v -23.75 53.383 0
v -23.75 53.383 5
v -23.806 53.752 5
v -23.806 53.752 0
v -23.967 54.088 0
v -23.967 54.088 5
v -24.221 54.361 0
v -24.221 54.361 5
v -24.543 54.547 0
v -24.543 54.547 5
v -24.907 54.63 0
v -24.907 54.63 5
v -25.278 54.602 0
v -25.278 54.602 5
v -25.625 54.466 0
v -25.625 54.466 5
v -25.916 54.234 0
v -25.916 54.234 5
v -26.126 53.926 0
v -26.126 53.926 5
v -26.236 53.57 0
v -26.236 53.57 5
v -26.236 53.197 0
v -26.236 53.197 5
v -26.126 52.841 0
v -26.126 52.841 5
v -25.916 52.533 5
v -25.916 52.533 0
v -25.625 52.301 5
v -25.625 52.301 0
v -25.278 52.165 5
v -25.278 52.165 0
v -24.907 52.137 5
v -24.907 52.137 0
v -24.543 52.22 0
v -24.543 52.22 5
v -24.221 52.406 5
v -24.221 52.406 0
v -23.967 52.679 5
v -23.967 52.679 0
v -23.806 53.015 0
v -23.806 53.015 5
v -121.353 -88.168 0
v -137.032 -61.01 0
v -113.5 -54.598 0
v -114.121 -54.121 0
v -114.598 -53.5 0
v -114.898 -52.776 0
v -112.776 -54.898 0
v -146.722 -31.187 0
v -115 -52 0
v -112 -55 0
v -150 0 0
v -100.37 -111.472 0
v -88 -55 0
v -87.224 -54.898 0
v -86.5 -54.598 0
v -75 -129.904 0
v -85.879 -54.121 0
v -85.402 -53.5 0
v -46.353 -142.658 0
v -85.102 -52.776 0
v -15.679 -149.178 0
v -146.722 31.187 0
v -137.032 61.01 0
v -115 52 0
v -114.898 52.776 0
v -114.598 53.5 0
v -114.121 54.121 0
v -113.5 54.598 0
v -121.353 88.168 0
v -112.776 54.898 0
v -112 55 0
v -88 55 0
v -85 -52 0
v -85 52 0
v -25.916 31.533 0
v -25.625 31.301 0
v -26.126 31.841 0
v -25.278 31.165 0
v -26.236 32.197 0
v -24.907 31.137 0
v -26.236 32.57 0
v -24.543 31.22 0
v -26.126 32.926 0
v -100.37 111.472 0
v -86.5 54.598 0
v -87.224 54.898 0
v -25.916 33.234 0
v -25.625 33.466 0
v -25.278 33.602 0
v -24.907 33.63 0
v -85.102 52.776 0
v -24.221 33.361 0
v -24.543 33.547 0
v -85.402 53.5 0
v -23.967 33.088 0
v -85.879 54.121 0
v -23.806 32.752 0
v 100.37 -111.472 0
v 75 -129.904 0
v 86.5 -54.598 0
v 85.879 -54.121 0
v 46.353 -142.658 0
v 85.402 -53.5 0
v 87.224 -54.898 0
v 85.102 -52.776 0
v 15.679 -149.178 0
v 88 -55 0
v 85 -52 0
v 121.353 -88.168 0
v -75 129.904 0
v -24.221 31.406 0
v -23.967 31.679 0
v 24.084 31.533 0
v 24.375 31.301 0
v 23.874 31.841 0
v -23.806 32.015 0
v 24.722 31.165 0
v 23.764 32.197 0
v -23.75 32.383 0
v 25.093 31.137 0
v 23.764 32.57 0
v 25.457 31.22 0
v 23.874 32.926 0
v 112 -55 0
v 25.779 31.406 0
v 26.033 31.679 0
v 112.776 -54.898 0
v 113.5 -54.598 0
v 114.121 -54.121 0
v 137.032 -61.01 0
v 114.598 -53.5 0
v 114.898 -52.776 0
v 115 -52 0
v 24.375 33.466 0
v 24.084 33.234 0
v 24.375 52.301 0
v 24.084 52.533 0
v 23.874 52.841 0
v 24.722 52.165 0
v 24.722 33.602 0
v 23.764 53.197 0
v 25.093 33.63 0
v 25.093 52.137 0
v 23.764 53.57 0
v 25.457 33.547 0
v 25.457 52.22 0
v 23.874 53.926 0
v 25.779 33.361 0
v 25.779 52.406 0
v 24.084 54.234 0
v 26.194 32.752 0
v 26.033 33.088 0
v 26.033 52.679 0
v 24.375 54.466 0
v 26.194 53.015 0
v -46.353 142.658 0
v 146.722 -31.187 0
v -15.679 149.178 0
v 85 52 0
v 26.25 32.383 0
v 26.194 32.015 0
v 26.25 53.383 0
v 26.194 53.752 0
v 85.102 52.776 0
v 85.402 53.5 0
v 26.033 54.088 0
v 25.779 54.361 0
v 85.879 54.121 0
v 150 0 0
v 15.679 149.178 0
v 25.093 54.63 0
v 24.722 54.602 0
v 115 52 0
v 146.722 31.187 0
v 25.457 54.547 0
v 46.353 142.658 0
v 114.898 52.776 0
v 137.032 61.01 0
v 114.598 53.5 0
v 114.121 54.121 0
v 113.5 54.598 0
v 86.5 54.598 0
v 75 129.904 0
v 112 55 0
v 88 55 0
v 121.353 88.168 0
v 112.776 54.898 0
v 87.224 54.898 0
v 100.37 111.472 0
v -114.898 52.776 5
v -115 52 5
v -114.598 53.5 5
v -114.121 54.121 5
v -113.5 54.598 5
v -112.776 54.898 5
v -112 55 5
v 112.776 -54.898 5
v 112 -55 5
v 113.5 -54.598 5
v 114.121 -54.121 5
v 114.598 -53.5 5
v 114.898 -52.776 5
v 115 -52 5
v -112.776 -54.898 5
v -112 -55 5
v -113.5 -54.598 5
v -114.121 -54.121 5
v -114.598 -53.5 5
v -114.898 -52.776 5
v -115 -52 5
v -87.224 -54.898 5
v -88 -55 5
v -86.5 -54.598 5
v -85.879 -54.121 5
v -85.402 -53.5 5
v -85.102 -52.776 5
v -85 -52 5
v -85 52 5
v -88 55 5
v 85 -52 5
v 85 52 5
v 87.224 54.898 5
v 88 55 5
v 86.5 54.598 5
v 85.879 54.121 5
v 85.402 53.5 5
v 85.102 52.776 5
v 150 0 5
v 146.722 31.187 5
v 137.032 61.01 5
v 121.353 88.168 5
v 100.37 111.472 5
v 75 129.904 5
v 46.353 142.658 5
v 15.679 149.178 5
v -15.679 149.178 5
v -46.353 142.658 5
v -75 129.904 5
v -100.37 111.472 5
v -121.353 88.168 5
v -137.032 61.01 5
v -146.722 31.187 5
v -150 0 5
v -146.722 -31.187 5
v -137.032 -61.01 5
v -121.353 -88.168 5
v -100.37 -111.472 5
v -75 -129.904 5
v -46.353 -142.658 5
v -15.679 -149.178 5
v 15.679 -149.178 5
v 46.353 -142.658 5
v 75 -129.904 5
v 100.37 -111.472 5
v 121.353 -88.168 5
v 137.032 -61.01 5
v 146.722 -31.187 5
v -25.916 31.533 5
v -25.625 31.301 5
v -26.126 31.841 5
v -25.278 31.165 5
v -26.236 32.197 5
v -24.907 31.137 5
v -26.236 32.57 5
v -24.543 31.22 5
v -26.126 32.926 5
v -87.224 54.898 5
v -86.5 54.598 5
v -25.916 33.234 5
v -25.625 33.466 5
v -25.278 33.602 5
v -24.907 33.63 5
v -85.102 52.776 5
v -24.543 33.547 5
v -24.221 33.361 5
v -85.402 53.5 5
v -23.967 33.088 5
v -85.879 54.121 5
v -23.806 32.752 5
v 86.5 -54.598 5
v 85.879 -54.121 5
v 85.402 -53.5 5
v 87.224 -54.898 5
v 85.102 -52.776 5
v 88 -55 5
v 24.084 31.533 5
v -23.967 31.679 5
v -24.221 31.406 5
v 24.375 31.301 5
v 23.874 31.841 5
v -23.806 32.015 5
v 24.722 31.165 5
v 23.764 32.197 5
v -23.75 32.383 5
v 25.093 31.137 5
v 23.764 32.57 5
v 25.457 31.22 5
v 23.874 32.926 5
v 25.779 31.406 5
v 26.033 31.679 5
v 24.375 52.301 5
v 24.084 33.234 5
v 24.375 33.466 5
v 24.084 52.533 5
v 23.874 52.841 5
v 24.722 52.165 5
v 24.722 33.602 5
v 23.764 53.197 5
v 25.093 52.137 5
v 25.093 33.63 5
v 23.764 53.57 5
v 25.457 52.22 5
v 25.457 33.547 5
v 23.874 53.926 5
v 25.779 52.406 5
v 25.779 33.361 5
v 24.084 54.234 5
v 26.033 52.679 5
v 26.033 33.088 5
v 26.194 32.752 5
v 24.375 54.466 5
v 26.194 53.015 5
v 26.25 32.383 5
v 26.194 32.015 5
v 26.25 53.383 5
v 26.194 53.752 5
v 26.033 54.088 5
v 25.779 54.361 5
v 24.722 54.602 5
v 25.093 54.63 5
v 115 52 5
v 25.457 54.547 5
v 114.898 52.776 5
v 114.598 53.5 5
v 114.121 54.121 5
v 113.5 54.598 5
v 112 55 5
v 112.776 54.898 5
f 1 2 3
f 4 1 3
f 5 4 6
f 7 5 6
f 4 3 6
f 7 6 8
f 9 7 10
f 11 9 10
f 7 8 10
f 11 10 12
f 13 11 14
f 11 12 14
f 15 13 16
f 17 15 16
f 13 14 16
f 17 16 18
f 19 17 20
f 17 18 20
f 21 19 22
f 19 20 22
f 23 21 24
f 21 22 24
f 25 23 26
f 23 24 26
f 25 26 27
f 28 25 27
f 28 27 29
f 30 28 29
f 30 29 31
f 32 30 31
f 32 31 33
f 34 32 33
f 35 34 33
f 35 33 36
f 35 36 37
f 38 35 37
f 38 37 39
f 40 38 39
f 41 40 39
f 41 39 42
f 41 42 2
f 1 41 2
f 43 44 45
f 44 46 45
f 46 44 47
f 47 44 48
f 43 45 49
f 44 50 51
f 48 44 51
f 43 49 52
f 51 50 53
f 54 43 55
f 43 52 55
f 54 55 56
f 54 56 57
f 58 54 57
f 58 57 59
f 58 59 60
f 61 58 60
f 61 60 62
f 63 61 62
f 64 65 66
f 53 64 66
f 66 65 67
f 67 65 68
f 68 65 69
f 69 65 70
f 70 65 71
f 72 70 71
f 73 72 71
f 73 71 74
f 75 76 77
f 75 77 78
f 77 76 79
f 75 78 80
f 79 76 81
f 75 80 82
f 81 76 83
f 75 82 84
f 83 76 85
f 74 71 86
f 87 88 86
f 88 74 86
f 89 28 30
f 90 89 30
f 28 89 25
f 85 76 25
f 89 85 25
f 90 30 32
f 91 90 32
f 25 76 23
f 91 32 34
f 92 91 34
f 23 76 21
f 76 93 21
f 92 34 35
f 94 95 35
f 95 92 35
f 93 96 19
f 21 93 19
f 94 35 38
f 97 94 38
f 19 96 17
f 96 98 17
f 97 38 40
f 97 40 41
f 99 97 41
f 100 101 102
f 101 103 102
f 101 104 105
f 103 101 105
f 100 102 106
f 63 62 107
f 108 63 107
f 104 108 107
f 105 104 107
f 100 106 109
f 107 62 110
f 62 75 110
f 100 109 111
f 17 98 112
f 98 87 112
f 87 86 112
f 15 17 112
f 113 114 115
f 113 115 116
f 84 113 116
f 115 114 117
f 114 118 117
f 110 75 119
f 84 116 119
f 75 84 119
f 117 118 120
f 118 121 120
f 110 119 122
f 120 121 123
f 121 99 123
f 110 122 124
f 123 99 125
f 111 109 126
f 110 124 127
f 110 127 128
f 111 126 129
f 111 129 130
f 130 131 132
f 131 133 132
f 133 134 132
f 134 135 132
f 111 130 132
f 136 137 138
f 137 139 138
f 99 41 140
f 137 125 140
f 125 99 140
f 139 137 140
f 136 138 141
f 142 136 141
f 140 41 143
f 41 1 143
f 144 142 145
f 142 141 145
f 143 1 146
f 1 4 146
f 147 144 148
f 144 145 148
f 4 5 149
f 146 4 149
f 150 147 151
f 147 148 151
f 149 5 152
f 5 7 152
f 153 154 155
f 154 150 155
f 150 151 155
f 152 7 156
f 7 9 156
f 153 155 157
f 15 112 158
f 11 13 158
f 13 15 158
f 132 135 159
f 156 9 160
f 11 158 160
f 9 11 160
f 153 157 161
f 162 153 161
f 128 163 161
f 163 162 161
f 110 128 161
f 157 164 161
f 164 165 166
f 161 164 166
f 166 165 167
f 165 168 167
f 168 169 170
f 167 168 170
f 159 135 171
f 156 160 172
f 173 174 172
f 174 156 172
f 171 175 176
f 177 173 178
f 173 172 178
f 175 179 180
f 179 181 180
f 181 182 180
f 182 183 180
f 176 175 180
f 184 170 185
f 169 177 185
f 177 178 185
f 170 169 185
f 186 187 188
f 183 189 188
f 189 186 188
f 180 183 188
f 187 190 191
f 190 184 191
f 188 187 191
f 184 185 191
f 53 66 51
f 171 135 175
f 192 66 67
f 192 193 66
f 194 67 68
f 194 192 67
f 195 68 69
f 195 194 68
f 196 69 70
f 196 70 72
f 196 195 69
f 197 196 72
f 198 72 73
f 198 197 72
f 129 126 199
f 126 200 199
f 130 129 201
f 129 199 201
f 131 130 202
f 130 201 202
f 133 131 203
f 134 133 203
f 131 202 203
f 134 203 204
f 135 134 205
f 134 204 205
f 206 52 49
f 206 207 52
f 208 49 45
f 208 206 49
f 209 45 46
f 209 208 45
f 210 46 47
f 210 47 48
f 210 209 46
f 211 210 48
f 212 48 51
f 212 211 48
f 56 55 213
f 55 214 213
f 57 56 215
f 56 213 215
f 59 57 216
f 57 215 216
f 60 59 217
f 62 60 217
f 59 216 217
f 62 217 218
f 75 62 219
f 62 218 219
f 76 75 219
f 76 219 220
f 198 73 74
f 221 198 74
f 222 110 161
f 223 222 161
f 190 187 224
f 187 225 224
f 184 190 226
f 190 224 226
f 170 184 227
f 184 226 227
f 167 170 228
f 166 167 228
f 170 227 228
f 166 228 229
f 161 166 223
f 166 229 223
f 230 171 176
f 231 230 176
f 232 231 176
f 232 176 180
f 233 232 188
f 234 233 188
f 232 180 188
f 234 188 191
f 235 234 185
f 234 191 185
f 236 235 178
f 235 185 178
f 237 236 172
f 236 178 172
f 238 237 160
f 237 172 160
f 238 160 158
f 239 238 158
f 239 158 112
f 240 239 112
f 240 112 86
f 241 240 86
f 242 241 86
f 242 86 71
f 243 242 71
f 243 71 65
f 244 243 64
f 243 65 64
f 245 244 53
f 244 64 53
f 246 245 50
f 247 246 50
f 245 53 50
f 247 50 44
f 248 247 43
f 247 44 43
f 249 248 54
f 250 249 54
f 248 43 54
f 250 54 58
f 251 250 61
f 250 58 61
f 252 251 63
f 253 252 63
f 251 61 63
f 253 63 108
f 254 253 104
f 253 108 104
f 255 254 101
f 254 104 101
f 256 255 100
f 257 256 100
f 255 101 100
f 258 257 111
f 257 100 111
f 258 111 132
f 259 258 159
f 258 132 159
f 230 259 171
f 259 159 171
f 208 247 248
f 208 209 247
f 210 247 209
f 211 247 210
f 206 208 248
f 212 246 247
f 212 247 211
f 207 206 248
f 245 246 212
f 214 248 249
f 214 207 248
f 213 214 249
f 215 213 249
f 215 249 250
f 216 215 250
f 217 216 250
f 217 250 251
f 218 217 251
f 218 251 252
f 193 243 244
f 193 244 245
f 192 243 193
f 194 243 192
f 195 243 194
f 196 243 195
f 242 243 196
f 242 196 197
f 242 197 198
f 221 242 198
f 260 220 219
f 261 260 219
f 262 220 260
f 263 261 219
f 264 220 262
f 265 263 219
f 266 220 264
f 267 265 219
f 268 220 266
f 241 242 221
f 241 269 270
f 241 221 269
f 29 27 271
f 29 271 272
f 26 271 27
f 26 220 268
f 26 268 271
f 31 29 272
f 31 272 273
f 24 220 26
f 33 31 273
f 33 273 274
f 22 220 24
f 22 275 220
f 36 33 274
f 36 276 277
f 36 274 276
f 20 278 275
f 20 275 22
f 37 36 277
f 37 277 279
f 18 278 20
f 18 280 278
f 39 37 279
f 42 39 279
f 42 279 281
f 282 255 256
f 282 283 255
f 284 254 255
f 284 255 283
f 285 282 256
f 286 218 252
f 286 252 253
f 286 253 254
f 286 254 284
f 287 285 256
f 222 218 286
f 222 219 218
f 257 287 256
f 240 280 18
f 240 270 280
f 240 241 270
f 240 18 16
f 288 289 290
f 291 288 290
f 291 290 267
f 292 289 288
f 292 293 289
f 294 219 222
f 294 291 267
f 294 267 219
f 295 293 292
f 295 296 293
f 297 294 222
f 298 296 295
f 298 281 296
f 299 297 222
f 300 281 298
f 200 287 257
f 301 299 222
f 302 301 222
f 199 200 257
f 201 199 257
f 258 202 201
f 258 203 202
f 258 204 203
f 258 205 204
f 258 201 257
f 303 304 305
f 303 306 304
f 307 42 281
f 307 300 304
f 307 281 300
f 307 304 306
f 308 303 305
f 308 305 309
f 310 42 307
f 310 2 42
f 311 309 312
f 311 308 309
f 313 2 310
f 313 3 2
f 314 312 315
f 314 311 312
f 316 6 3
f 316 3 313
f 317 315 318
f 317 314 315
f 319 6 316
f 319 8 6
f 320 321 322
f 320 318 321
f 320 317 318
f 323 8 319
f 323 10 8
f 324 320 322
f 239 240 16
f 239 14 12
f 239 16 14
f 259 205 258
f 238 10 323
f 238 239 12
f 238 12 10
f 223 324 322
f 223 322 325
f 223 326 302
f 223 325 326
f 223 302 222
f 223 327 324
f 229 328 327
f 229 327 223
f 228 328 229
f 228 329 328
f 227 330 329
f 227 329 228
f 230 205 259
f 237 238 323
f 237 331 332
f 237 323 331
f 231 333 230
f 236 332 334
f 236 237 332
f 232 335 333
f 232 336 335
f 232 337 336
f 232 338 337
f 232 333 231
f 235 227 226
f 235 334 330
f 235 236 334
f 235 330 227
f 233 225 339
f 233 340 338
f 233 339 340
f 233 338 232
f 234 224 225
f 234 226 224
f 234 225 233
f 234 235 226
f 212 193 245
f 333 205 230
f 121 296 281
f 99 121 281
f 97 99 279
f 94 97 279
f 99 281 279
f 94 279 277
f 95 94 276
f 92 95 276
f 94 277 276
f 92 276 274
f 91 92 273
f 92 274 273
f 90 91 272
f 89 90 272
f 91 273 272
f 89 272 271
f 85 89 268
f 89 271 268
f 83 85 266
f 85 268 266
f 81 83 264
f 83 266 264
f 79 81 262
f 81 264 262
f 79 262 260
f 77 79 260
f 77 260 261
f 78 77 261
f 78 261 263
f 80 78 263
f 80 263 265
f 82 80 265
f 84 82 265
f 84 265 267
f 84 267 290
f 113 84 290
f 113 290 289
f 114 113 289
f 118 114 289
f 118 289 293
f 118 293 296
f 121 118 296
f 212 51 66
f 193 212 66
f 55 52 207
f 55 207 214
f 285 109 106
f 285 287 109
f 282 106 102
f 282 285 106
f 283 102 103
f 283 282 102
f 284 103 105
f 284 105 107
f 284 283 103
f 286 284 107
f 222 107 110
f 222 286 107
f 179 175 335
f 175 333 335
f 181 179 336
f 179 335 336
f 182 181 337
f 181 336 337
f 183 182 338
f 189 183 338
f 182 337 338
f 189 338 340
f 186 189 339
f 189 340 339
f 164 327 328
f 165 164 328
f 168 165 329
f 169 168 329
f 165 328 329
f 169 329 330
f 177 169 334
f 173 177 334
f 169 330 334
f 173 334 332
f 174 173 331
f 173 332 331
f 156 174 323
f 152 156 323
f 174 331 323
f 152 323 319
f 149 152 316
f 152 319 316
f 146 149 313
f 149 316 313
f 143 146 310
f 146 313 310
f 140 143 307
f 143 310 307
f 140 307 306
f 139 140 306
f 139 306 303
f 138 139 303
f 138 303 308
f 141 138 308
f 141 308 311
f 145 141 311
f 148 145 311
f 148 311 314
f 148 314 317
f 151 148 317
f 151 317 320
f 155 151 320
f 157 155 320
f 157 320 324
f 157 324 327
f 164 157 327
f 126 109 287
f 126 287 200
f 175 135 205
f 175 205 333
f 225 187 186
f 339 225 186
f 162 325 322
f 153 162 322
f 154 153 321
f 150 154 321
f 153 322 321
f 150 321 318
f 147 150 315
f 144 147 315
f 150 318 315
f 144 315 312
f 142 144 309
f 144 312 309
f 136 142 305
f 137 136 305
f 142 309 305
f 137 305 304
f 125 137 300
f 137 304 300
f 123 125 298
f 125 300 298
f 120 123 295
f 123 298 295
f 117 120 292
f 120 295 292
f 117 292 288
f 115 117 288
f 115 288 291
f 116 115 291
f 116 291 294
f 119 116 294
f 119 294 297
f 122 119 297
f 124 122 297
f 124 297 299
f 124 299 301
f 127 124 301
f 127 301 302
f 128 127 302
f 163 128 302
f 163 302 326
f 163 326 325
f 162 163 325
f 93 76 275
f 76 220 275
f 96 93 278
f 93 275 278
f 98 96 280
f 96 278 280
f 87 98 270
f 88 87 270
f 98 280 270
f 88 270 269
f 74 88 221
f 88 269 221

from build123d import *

# Parameters (mm, degrees)
SKETCH_R     = 150
SKETCH_W     = 30
SKETCH_H     = 110
PAD_DEPTH    = 5
FILLET_R     = 3
SKETCH003_R  = 1.25
POCKET_DEPTH = 5.001


with BuildPart() as part:
    # Sketch → Pad (new body)
    with BuildSketch(Plane.XY):
        Circle(SKETCH_R)
        with Locations((-100, 0)):
            Rectangle(SKETCH_W, SKETCH_H, mode=Mode.SUBTRACT)
        with Locations((100, 0)):
            Rectangle(SKETCH_W, SKETCH_H, mode=Mode.SUBTRACT)
    extrude(amount=PAD_DEPTH)

    # Fillet
    fillet_edges = [part.edges().sort_by_distance(p)[0] for p in [
        (-115, -55, 2.5),
        (85, -55, 2.5),
        (115, -55, 2.5),
        (-85, -55, 2.5),
        (115, 55, 2.5),
        (-85, 55, 2.5),
        (-115, 55, 2.5),
        (85, 55, 2.5),
    ]]
    fillet(fillet_edges, radius=FILLET_R)

    # Sketch003 → Pocket (cut, through all)
    with BuildSketch(Plane.XY.offset(5)):
        with Locations((-25, 53.38341)):
            Circle(SKETCH003_R)
        with Locations((25, 53.38341)):
            Circle(SKETCH003_R)
        with Locations((-25, 32.38341)):
            Circle(SKETCH003_R)
        with Locations((25, 32.38341)):
            Circle(SKETCH003_R)
    extrude(amount=-POCKET_DEPTH, mode=Mode.SUBTRACT)


solid = part.part
